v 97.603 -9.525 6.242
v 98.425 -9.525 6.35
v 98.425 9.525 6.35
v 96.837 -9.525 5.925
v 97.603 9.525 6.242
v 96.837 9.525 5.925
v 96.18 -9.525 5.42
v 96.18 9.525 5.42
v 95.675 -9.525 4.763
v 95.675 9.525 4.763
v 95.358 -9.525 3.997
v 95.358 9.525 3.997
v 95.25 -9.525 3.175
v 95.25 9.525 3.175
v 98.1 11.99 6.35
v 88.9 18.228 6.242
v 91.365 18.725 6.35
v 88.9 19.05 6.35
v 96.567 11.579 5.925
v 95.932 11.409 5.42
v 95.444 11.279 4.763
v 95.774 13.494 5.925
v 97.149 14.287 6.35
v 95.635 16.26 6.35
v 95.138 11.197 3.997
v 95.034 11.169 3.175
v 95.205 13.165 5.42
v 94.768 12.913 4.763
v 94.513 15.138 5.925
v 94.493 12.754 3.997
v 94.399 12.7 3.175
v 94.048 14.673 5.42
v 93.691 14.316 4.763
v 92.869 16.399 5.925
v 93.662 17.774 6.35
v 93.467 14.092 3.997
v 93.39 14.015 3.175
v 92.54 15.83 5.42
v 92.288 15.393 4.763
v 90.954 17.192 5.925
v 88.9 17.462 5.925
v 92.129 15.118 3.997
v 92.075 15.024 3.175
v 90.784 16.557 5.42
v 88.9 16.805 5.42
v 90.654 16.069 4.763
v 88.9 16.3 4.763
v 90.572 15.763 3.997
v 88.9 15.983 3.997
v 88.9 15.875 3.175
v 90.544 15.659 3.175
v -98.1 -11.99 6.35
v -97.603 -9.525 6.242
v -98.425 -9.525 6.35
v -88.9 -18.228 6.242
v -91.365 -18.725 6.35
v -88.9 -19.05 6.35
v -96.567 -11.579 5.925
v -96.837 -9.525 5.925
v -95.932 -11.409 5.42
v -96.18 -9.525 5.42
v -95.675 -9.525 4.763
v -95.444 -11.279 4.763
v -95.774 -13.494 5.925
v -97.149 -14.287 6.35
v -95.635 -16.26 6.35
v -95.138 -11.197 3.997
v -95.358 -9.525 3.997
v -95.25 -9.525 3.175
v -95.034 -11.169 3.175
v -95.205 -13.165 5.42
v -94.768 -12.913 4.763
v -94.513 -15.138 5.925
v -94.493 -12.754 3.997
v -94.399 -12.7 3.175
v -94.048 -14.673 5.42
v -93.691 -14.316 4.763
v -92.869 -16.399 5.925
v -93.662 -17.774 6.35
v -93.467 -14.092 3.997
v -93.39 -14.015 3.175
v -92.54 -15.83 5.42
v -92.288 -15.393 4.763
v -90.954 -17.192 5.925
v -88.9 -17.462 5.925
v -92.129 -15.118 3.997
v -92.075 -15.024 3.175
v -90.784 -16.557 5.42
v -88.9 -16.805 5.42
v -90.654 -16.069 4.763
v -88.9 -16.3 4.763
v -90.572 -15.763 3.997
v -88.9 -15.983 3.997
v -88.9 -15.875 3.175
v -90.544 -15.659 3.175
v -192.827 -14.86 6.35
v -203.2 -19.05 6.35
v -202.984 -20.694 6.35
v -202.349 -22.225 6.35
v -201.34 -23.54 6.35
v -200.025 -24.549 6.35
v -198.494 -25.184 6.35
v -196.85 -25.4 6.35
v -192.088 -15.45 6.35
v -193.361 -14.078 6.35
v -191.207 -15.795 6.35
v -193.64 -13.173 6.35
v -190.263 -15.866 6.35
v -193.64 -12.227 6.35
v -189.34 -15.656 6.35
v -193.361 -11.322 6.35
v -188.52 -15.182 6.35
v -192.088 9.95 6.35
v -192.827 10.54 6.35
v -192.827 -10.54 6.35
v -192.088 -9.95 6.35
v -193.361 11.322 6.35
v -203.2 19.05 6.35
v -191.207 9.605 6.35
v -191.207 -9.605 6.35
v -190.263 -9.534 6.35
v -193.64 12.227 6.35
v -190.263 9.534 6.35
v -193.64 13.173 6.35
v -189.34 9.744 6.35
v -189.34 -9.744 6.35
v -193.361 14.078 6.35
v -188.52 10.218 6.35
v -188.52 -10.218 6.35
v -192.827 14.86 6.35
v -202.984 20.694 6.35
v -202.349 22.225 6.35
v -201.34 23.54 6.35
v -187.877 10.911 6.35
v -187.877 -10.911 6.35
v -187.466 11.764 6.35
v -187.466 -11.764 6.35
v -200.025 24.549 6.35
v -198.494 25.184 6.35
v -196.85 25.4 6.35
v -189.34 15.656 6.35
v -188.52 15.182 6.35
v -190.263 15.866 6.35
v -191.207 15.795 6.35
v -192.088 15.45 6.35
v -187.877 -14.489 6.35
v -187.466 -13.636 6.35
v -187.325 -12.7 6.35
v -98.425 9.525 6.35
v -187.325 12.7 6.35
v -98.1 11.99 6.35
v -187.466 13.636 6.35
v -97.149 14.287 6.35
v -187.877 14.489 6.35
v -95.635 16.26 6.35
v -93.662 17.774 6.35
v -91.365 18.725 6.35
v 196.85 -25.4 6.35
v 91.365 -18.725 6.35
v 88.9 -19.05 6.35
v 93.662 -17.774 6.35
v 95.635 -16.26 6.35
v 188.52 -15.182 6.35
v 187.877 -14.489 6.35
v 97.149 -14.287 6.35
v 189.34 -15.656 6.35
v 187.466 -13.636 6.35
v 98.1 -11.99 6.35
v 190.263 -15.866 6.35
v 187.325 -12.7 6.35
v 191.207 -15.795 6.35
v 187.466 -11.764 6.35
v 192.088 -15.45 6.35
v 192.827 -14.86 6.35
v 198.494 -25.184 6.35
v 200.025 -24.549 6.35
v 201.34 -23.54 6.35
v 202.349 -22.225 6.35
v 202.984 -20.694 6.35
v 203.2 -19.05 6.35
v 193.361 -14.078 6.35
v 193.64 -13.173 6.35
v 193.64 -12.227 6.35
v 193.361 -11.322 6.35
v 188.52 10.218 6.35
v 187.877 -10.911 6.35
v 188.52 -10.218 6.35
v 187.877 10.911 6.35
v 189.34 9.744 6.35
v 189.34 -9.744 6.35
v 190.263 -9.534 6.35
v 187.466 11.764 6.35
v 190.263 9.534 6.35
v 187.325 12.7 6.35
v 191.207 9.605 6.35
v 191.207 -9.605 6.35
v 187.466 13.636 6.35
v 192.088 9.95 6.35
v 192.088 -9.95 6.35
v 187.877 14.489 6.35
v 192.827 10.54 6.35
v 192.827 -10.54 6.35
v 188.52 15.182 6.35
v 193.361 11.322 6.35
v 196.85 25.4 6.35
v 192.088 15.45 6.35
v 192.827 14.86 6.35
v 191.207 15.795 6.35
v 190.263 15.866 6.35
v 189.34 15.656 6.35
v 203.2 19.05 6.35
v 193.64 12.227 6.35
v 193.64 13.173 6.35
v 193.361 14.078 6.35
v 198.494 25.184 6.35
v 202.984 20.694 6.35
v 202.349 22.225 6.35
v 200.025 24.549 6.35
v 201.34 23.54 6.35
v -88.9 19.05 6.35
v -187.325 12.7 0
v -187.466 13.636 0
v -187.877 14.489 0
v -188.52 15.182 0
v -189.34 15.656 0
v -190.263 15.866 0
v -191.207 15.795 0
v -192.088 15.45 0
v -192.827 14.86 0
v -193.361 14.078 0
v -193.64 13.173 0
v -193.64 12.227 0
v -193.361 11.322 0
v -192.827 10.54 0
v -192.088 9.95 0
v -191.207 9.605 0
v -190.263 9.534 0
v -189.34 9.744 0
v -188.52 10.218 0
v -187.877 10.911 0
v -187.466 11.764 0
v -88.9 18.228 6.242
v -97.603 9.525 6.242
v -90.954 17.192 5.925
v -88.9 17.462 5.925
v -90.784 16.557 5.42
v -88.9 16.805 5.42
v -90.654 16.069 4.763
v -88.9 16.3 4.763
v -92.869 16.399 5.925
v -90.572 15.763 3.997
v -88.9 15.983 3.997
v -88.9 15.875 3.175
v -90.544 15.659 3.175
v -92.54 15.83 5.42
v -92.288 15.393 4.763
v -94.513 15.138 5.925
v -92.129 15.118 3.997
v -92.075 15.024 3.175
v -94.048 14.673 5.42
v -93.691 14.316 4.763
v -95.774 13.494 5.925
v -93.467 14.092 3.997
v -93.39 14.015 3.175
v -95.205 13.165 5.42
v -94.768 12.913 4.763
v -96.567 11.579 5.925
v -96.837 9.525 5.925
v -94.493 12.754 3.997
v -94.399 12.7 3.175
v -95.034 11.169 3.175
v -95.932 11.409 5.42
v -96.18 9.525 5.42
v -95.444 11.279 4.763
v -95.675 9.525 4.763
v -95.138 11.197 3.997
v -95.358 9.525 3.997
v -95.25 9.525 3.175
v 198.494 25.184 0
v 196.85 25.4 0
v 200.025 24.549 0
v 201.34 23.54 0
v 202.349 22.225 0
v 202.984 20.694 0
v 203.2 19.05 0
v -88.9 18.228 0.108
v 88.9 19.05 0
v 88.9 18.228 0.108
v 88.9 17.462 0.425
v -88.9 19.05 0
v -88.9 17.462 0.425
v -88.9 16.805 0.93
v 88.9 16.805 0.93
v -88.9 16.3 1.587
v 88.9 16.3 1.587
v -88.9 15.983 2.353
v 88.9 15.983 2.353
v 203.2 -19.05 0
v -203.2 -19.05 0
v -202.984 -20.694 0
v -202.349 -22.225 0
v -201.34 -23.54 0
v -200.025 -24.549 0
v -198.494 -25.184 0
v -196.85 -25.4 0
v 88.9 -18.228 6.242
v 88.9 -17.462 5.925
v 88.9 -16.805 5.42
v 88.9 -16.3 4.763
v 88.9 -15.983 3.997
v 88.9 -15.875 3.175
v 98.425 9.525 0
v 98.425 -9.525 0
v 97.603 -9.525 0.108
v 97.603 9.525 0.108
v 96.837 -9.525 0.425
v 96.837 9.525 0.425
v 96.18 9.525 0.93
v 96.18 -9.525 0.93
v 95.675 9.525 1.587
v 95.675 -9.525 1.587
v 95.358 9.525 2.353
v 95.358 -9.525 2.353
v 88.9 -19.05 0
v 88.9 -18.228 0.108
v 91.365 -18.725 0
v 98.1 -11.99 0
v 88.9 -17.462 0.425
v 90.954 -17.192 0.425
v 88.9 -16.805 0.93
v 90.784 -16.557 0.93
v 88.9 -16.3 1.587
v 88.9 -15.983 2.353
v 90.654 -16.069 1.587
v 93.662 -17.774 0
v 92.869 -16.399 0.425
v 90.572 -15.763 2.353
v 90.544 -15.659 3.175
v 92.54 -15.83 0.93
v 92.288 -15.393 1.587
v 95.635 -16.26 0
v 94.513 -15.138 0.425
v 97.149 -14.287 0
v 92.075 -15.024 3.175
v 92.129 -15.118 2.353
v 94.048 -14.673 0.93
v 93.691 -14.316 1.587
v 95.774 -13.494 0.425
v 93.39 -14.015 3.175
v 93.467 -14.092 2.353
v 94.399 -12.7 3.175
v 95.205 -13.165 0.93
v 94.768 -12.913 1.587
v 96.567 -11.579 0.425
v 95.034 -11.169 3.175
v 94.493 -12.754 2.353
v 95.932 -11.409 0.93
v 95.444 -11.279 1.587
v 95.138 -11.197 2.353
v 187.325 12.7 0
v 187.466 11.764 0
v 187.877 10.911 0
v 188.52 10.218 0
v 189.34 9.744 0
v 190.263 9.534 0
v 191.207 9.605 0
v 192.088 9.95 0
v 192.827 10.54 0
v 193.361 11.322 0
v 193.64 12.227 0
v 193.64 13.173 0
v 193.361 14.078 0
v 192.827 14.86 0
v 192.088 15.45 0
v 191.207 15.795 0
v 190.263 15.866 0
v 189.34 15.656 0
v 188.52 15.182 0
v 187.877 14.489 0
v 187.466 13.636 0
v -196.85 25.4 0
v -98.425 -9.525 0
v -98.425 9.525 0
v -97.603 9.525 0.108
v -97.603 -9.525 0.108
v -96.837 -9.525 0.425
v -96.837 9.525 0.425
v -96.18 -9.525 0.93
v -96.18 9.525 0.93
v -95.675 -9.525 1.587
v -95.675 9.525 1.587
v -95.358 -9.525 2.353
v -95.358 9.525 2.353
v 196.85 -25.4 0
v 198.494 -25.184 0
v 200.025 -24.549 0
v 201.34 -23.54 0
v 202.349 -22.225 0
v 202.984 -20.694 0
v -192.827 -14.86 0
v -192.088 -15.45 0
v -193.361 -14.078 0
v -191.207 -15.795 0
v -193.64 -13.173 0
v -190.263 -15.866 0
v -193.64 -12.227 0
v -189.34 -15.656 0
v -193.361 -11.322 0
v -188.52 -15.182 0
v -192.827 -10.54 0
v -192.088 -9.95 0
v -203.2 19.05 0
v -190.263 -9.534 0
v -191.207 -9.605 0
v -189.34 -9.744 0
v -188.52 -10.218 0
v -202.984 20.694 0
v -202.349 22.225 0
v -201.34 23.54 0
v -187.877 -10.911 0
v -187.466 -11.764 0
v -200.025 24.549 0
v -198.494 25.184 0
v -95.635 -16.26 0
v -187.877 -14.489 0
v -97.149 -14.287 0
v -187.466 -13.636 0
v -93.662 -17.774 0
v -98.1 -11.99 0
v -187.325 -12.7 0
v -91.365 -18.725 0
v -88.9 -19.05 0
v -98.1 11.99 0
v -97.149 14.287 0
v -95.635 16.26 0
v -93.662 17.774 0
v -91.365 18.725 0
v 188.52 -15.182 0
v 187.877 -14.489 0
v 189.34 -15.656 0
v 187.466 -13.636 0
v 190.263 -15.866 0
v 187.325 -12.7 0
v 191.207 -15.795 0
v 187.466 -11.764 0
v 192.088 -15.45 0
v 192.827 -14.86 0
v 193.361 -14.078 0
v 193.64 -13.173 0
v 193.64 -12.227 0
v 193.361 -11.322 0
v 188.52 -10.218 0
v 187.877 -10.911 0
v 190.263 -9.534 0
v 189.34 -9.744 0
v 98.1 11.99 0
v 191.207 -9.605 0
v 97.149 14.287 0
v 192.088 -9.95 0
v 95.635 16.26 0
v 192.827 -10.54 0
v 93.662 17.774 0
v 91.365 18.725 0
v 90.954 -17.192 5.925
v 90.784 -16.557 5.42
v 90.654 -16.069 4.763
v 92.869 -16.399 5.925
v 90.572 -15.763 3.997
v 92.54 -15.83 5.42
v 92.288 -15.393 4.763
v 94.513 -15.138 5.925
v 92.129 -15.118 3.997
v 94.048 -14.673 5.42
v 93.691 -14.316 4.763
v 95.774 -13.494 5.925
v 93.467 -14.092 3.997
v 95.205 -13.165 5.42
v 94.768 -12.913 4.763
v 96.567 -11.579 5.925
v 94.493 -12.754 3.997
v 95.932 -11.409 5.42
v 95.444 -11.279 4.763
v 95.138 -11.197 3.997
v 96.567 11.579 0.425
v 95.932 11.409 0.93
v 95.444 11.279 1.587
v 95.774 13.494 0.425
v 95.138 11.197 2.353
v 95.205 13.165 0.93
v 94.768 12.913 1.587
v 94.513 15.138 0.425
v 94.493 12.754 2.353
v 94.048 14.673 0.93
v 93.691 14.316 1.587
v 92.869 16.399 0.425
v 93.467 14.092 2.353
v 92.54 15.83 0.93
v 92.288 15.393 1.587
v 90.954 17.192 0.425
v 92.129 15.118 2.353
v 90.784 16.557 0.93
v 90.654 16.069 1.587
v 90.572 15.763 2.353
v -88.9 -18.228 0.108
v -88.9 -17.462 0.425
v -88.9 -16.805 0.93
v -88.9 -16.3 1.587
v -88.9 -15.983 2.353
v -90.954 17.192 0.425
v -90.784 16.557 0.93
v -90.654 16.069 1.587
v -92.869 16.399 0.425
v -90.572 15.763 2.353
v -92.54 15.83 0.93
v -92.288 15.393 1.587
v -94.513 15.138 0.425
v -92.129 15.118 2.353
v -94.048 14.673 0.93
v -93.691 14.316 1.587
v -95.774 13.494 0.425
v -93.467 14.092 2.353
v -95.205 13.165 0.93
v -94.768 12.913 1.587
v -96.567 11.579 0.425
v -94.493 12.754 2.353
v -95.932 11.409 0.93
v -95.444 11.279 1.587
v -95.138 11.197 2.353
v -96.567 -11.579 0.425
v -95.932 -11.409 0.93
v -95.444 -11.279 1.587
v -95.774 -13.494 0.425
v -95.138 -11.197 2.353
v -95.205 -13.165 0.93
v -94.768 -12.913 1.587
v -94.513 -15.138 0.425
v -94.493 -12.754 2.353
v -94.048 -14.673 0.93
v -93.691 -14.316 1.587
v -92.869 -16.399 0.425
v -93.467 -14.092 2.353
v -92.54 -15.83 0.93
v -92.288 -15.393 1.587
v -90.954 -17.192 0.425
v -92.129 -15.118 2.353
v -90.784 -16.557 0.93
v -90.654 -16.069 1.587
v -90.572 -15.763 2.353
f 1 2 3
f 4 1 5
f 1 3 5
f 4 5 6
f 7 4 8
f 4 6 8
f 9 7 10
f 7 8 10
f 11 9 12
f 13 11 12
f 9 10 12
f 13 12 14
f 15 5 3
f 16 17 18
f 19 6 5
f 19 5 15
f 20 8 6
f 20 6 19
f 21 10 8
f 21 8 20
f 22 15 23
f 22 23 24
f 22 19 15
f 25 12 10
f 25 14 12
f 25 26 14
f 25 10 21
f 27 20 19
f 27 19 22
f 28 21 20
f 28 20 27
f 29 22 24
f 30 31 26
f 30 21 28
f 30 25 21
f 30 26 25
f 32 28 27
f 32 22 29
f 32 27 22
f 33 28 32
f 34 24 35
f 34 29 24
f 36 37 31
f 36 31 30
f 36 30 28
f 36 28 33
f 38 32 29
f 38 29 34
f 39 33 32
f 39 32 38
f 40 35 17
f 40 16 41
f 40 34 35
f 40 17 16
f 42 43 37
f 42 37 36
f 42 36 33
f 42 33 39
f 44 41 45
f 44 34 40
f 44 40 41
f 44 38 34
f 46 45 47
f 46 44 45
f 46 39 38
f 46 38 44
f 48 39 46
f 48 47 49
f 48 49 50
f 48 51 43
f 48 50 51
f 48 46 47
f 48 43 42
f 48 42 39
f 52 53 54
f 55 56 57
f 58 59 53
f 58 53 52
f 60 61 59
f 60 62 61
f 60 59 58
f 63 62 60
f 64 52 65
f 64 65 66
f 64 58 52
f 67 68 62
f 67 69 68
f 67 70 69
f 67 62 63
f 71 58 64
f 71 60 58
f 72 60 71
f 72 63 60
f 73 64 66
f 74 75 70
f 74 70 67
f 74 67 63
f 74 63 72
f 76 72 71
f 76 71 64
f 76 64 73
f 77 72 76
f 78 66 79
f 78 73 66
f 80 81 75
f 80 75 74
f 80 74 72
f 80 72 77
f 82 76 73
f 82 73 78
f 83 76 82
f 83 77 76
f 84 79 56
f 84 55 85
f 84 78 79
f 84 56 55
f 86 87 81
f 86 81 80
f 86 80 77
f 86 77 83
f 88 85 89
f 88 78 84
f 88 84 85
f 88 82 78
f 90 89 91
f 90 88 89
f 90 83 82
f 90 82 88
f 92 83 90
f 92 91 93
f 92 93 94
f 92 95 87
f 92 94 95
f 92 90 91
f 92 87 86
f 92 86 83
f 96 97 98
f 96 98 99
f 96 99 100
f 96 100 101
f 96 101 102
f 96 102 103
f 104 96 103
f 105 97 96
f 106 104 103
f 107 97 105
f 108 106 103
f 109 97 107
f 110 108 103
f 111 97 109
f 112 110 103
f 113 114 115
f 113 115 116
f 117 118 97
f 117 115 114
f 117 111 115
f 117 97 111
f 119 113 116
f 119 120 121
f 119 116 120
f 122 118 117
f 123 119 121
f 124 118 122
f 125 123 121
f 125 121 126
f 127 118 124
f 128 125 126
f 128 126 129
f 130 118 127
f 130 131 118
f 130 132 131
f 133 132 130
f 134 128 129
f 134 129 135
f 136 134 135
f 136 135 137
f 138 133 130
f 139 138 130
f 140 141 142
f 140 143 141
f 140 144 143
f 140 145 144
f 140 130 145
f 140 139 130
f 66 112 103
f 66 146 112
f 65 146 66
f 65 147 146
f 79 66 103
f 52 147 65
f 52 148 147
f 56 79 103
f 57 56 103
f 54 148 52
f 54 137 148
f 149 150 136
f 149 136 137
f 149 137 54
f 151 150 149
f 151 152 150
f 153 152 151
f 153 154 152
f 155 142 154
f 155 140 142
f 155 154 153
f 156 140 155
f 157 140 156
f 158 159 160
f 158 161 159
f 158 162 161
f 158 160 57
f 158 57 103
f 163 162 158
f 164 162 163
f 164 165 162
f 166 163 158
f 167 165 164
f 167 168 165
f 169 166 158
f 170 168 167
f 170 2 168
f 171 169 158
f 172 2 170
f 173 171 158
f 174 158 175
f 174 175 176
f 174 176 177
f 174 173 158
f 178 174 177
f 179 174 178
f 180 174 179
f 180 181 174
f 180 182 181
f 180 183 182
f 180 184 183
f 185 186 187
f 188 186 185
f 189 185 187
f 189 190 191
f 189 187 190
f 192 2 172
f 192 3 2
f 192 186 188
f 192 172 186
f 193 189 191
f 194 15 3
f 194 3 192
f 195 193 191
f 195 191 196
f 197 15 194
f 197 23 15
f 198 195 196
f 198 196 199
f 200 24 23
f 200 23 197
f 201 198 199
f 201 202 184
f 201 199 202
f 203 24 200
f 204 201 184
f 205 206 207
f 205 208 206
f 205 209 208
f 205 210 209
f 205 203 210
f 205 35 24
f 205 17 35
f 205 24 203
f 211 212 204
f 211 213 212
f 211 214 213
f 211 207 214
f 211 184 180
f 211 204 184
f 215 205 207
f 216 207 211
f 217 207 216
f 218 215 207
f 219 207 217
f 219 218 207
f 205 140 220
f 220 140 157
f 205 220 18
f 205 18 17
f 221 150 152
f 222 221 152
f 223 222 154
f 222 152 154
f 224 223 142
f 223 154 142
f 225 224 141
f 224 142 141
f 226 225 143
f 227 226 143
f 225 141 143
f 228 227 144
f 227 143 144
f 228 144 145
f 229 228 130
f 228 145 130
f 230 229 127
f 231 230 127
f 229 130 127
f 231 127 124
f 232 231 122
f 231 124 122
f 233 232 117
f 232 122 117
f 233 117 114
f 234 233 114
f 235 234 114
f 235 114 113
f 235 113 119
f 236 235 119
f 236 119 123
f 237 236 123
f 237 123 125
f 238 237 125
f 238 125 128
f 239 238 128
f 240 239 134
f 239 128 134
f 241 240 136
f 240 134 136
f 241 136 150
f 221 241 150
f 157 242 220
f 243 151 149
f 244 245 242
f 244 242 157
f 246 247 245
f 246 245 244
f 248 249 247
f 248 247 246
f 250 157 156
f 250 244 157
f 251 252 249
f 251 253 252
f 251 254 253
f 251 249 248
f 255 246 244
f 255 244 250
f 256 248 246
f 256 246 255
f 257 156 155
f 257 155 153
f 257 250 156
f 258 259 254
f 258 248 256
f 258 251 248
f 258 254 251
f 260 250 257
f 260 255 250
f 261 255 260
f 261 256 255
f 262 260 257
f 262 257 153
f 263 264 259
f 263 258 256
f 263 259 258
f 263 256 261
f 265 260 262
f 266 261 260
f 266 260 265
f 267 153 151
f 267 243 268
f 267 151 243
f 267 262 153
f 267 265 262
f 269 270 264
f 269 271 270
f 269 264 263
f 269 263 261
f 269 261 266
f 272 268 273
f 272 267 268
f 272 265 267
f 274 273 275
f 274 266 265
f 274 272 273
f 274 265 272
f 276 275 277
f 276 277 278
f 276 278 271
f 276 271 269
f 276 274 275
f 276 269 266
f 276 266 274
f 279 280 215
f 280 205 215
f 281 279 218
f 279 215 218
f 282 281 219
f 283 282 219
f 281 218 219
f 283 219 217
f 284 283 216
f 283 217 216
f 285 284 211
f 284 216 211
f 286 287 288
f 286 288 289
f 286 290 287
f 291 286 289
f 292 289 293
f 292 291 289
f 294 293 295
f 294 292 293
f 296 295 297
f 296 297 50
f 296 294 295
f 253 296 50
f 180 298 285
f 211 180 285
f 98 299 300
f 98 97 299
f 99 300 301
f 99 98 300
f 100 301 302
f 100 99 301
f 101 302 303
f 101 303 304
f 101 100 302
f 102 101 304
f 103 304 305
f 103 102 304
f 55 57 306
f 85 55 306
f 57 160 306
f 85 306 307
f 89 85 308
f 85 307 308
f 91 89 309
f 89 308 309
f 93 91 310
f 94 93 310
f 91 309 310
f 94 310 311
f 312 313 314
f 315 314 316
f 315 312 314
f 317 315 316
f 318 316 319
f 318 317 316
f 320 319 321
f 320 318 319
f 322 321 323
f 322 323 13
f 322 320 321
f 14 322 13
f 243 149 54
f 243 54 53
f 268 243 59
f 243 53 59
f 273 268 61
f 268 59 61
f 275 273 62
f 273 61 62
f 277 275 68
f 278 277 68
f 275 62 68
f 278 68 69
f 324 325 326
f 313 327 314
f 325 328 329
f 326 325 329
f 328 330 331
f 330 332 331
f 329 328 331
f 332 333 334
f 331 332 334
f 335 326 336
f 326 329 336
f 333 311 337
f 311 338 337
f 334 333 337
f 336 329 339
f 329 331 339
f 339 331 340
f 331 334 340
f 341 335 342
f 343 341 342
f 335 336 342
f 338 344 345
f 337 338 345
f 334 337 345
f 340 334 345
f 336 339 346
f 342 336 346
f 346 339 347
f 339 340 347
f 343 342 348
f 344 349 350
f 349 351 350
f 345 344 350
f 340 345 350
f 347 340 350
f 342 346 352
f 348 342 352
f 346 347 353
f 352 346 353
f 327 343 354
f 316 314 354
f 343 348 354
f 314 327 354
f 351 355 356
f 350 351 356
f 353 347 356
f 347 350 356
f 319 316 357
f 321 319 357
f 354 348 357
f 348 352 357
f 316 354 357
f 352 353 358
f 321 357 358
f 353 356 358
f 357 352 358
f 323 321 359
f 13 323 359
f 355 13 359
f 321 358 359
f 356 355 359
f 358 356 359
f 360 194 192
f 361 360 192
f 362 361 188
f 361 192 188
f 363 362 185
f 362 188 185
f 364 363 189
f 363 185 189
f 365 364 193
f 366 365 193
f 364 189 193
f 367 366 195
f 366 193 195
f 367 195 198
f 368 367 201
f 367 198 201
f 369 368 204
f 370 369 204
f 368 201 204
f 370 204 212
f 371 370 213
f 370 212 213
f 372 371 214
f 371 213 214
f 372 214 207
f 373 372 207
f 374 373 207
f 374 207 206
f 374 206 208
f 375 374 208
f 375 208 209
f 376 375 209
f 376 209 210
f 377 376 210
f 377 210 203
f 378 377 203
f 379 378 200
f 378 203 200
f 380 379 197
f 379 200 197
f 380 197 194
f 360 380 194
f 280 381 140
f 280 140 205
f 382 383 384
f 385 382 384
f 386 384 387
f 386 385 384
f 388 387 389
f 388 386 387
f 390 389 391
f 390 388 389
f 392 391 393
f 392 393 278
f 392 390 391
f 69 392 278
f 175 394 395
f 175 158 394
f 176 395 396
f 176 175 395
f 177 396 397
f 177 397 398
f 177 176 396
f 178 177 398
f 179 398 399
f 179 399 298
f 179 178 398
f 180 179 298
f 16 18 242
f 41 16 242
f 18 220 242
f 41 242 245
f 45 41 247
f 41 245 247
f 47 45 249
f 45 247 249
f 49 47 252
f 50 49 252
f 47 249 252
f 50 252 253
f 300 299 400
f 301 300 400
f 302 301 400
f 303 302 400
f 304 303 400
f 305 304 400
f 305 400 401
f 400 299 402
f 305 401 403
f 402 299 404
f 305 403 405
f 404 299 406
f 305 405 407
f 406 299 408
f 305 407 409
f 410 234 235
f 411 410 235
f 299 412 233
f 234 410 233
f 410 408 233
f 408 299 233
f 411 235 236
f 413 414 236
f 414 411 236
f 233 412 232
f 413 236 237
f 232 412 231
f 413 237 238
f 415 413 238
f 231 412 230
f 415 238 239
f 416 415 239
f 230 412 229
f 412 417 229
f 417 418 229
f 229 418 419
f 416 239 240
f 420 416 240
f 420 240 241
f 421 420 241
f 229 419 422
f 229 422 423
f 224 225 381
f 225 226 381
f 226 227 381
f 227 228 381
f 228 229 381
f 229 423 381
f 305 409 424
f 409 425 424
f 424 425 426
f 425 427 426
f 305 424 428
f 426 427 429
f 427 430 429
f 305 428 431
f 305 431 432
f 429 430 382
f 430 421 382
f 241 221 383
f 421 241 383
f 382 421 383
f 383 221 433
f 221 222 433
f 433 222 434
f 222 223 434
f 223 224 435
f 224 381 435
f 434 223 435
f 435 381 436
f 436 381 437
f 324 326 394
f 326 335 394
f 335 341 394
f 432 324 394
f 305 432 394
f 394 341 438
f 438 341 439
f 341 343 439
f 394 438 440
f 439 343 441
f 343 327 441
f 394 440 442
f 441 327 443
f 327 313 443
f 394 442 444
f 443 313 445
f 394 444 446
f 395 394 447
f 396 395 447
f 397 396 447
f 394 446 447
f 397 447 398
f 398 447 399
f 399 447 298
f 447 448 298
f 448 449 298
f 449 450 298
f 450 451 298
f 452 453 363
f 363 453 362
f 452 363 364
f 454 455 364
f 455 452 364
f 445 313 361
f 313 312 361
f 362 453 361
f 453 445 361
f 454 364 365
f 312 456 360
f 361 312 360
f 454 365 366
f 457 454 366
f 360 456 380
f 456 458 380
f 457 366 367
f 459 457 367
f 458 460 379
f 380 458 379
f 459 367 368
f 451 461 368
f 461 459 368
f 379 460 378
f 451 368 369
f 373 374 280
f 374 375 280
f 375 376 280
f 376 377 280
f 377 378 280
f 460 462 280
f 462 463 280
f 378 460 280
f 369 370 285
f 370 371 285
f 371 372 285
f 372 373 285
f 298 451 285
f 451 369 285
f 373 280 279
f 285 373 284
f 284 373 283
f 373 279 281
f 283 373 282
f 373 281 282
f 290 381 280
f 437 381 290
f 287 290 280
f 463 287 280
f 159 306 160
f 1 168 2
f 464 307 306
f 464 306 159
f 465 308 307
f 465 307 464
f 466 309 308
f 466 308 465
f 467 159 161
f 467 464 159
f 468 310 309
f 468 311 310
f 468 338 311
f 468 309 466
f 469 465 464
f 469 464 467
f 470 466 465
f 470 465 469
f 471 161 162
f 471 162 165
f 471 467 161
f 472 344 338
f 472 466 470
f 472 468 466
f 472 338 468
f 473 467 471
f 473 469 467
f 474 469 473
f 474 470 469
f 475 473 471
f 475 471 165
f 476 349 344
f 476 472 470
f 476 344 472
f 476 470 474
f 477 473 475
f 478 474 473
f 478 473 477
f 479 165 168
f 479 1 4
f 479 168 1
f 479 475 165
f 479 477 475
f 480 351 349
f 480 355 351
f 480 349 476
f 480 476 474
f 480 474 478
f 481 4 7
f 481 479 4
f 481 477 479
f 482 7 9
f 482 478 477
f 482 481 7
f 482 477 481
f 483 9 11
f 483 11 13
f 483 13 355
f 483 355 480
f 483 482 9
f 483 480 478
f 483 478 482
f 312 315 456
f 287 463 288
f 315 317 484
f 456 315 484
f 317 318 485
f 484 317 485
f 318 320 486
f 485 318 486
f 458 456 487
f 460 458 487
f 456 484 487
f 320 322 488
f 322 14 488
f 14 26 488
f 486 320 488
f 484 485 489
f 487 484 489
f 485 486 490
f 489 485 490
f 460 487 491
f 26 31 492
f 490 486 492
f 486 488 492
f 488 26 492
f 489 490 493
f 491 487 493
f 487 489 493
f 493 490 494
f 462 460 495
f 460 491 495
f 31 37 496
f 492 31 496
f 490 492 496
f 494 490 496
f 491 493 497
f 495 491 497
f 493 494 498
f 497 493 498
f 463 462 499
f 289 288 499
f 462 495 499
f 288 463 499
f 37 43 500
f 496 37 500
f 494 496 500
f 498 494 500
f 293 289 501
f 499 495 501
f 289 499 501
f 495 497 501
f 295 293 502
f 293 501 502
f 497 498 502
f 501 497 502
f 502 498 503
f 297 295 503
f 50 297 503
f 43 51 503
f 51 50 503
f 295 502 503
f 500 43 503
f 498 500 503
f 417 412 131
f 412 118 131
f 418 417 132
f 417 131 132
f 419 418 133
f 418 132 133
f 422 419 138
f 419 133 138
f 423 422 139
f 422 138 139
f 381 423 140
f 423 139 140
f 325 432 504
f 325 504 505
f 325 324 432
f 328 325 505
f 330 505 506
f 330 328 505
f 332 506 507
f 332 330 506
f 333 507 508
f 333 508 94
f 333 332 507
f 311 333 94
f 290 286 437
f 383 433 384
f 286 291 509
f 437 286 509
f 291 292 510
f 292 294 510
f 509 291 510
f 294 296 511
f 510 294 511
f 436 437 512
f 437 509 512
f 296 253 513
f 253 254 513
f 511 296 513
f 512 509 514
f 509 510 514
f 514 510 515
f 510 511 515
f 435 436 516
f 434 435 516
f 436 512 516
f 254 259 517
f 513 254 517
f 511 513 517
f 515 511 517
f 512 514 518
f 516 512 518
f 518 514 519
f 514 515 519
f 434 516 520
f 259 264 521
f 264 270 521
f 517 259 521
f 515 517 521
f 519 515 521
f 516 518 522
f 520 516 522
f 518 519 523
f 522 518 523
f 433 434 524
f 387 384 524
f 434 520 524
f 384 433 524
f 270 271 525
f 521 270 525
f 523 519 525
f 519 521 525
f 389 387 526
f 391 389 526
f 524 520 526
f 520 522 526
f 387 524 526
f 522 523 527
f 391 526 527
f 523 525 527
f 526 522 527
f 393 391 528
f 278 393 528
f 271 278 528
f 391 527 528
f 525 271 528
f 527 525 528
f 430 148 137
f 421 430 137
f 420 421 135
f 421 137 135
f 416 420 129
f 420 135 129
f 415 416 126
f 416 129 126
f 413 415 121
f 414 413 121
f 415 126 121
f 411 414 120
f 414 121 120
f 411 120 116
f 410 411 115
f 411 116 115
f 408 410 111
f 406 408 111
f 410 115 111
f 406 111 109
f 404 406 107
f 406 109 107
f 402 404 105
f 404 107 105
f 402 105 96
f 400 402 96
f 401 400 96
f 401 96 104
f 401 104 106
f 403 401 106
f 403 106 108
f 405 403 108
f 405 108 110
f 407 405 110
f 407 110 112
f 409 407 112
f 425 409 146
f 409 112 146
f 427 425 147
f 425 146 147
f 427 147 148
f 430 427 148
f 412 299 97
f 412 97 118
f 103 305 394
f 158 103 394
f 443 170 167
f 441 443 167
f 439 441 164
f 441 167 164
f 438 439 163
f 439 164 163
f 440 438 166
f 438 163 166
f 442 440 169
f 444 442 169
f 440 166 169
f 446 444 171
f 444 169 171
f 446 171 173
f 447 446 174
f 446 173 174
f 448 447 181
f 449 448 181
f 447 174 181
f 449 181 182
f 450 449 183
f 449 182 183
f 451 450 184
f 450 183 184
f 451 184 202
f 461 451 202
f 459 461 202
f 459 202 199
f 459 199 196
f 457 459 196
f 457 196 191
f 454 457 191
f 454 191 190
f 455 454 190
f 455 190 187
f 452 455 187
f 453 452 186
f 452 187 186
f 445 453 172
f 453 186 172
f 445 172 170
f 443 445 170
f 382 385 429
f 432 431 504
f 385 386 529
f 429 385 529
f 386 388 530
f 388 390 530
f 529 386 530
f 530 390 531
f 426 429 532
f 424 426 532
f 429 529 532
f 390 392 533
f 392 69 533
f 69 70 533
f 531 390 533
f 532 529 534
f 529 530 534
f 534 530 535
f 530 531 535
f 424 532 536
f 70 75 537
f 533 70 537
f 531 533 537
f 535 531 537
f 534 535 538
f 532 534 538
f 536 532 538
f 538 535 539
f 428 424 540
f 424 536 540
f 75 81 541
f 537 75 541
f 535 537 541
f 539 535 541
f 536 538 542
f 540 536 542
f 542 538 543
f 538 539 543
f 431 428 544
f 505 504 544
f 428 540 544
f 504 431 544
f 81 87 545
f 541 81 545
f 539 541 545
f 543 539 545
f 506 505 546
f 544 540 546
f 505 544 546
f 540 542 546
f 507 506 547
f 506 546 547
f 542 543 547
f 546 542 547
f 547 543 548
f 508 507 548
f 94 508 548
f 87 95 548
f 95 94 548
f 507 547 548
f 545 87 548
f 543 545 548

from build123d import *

# Parameters (mm, degrees)
SKETCH1_W           = 406.4
SKETCH1_H           = 50.8
BOSS_EXTRUDE1_DEPTH = 6.35
CUT_EXTRUDE1_DEPTH  = 6.35
FILLET1_R           = 6.35
SKETCH3_R           = 3.175
CUT_EXTRUDE2_DEPTH  = 6.35
FILLET3_R           = 3.175


with BuildPart() as part:
    # Sketch1 → Boss-Extrude1 (new body)
    with BuildSketch(Plane.XY):
        Rectangle(SKETCH1_W, SKETCH1_H)
    extrude(amount=BOSS_EXTRUDE1_DEPTH)

    # Sketch2 → Cut-Extrude1 (cut)
    with BuildSketch(Plane.XY.offset(6.35)):
        with BuildLine():
            Line((-88.9, -15.875), (88.9, -15.875))
            ThreePointArc((88.9, -15.875), (93.390128061, -14.015128061), (95.25, -9.525))
            Line((95.25, -9.525), (95.25, 9.525))
            ThreePointArc((95.25, 9.525), (93.390128061, 14.015128061), (88.9, 15.875))
            Line((88.9, 15.875), (-88.9, 15.875))
            ThreePointArc((-88.9, 15.875), (-93.390128061, 14.015128061), (-95.25, 9.525))
            Line((-95.25, 9.525), (-95.25, -9.525))
            ThreePointArc((-95.25, -9.525), (-93.390128061, -14.015128061), (-88.9, -15.875))
        make_face()
    extrude(amount=-CUT_EXTRUDE1_DEPTH, mode=Mode.SUBTRACT)

    # Fillet1
    fillet1_edges = [part.edges().sort_by_distance(p)[0] for p in [
        (203.2, -25.4, 3.175),
        (-203.2, -25.4, 3.175),
        (-203.2, 25.4, 3.175),
        (203.2, 25.4, 3.175),
    ]]
    fillet(fillet1_edges, radius=FILLET1_R)

    # Sketch3 → Cut-Extrude2 (cut)
    with BuildSketch(Plane.XY.offset(6.35)):
        with Locations((-190.5, 12.7)):
            Circle(SKETCH3_R)
        with Locations((-190.5, -12.7)):
            Circle(SKETCH3_R)
        with Locations(Location((190.5, -12.7, 0), (0, 0, 180))):
            Circle(SKETCH3_R)
        with Locations(Location((190.5, 12.7, 0), (0, 0, 180))):
            Circle(SKETCH3_R)
    extrude(amount=-CUT_EXTRUDE2_DEPTH, mode=Mode.SUBTRACT)

    # Fillet3
    fillet3_edges = [part.edges().sort_by_distance(p)[0] for p in [
        (-93.390128061, -14.015128061, 0),
        (-95.25, 0, 0),
        (-93.390128061, 14.015128061, 0),
        (0, 15.875, 0),
        (93.390128061, 14.015128061, 0),
        (95.25, 0, 0),
        (93.390128061, -14.015128061, 0),
        (-93.390128061, -14.015128061, 6.35),
        (-95.25, 0, 6.35),
        (-93.390128061, 14.015128061, 6.35),
        (0, 15.875, 6.35),
        (93.390128061, 14.015128061, 6.35),
        (95.25, 0, 6.35),
        (93.390128061, -14.015128061, 6.35),
        (0, -15.875, 0),
        (0, -15.875, 6.35),
    ]]
    fillet(fillet3_edges, radius=FILLET3_R - 0.0001)  # a hair under: the kernel refuses the full size


solid = part.part
